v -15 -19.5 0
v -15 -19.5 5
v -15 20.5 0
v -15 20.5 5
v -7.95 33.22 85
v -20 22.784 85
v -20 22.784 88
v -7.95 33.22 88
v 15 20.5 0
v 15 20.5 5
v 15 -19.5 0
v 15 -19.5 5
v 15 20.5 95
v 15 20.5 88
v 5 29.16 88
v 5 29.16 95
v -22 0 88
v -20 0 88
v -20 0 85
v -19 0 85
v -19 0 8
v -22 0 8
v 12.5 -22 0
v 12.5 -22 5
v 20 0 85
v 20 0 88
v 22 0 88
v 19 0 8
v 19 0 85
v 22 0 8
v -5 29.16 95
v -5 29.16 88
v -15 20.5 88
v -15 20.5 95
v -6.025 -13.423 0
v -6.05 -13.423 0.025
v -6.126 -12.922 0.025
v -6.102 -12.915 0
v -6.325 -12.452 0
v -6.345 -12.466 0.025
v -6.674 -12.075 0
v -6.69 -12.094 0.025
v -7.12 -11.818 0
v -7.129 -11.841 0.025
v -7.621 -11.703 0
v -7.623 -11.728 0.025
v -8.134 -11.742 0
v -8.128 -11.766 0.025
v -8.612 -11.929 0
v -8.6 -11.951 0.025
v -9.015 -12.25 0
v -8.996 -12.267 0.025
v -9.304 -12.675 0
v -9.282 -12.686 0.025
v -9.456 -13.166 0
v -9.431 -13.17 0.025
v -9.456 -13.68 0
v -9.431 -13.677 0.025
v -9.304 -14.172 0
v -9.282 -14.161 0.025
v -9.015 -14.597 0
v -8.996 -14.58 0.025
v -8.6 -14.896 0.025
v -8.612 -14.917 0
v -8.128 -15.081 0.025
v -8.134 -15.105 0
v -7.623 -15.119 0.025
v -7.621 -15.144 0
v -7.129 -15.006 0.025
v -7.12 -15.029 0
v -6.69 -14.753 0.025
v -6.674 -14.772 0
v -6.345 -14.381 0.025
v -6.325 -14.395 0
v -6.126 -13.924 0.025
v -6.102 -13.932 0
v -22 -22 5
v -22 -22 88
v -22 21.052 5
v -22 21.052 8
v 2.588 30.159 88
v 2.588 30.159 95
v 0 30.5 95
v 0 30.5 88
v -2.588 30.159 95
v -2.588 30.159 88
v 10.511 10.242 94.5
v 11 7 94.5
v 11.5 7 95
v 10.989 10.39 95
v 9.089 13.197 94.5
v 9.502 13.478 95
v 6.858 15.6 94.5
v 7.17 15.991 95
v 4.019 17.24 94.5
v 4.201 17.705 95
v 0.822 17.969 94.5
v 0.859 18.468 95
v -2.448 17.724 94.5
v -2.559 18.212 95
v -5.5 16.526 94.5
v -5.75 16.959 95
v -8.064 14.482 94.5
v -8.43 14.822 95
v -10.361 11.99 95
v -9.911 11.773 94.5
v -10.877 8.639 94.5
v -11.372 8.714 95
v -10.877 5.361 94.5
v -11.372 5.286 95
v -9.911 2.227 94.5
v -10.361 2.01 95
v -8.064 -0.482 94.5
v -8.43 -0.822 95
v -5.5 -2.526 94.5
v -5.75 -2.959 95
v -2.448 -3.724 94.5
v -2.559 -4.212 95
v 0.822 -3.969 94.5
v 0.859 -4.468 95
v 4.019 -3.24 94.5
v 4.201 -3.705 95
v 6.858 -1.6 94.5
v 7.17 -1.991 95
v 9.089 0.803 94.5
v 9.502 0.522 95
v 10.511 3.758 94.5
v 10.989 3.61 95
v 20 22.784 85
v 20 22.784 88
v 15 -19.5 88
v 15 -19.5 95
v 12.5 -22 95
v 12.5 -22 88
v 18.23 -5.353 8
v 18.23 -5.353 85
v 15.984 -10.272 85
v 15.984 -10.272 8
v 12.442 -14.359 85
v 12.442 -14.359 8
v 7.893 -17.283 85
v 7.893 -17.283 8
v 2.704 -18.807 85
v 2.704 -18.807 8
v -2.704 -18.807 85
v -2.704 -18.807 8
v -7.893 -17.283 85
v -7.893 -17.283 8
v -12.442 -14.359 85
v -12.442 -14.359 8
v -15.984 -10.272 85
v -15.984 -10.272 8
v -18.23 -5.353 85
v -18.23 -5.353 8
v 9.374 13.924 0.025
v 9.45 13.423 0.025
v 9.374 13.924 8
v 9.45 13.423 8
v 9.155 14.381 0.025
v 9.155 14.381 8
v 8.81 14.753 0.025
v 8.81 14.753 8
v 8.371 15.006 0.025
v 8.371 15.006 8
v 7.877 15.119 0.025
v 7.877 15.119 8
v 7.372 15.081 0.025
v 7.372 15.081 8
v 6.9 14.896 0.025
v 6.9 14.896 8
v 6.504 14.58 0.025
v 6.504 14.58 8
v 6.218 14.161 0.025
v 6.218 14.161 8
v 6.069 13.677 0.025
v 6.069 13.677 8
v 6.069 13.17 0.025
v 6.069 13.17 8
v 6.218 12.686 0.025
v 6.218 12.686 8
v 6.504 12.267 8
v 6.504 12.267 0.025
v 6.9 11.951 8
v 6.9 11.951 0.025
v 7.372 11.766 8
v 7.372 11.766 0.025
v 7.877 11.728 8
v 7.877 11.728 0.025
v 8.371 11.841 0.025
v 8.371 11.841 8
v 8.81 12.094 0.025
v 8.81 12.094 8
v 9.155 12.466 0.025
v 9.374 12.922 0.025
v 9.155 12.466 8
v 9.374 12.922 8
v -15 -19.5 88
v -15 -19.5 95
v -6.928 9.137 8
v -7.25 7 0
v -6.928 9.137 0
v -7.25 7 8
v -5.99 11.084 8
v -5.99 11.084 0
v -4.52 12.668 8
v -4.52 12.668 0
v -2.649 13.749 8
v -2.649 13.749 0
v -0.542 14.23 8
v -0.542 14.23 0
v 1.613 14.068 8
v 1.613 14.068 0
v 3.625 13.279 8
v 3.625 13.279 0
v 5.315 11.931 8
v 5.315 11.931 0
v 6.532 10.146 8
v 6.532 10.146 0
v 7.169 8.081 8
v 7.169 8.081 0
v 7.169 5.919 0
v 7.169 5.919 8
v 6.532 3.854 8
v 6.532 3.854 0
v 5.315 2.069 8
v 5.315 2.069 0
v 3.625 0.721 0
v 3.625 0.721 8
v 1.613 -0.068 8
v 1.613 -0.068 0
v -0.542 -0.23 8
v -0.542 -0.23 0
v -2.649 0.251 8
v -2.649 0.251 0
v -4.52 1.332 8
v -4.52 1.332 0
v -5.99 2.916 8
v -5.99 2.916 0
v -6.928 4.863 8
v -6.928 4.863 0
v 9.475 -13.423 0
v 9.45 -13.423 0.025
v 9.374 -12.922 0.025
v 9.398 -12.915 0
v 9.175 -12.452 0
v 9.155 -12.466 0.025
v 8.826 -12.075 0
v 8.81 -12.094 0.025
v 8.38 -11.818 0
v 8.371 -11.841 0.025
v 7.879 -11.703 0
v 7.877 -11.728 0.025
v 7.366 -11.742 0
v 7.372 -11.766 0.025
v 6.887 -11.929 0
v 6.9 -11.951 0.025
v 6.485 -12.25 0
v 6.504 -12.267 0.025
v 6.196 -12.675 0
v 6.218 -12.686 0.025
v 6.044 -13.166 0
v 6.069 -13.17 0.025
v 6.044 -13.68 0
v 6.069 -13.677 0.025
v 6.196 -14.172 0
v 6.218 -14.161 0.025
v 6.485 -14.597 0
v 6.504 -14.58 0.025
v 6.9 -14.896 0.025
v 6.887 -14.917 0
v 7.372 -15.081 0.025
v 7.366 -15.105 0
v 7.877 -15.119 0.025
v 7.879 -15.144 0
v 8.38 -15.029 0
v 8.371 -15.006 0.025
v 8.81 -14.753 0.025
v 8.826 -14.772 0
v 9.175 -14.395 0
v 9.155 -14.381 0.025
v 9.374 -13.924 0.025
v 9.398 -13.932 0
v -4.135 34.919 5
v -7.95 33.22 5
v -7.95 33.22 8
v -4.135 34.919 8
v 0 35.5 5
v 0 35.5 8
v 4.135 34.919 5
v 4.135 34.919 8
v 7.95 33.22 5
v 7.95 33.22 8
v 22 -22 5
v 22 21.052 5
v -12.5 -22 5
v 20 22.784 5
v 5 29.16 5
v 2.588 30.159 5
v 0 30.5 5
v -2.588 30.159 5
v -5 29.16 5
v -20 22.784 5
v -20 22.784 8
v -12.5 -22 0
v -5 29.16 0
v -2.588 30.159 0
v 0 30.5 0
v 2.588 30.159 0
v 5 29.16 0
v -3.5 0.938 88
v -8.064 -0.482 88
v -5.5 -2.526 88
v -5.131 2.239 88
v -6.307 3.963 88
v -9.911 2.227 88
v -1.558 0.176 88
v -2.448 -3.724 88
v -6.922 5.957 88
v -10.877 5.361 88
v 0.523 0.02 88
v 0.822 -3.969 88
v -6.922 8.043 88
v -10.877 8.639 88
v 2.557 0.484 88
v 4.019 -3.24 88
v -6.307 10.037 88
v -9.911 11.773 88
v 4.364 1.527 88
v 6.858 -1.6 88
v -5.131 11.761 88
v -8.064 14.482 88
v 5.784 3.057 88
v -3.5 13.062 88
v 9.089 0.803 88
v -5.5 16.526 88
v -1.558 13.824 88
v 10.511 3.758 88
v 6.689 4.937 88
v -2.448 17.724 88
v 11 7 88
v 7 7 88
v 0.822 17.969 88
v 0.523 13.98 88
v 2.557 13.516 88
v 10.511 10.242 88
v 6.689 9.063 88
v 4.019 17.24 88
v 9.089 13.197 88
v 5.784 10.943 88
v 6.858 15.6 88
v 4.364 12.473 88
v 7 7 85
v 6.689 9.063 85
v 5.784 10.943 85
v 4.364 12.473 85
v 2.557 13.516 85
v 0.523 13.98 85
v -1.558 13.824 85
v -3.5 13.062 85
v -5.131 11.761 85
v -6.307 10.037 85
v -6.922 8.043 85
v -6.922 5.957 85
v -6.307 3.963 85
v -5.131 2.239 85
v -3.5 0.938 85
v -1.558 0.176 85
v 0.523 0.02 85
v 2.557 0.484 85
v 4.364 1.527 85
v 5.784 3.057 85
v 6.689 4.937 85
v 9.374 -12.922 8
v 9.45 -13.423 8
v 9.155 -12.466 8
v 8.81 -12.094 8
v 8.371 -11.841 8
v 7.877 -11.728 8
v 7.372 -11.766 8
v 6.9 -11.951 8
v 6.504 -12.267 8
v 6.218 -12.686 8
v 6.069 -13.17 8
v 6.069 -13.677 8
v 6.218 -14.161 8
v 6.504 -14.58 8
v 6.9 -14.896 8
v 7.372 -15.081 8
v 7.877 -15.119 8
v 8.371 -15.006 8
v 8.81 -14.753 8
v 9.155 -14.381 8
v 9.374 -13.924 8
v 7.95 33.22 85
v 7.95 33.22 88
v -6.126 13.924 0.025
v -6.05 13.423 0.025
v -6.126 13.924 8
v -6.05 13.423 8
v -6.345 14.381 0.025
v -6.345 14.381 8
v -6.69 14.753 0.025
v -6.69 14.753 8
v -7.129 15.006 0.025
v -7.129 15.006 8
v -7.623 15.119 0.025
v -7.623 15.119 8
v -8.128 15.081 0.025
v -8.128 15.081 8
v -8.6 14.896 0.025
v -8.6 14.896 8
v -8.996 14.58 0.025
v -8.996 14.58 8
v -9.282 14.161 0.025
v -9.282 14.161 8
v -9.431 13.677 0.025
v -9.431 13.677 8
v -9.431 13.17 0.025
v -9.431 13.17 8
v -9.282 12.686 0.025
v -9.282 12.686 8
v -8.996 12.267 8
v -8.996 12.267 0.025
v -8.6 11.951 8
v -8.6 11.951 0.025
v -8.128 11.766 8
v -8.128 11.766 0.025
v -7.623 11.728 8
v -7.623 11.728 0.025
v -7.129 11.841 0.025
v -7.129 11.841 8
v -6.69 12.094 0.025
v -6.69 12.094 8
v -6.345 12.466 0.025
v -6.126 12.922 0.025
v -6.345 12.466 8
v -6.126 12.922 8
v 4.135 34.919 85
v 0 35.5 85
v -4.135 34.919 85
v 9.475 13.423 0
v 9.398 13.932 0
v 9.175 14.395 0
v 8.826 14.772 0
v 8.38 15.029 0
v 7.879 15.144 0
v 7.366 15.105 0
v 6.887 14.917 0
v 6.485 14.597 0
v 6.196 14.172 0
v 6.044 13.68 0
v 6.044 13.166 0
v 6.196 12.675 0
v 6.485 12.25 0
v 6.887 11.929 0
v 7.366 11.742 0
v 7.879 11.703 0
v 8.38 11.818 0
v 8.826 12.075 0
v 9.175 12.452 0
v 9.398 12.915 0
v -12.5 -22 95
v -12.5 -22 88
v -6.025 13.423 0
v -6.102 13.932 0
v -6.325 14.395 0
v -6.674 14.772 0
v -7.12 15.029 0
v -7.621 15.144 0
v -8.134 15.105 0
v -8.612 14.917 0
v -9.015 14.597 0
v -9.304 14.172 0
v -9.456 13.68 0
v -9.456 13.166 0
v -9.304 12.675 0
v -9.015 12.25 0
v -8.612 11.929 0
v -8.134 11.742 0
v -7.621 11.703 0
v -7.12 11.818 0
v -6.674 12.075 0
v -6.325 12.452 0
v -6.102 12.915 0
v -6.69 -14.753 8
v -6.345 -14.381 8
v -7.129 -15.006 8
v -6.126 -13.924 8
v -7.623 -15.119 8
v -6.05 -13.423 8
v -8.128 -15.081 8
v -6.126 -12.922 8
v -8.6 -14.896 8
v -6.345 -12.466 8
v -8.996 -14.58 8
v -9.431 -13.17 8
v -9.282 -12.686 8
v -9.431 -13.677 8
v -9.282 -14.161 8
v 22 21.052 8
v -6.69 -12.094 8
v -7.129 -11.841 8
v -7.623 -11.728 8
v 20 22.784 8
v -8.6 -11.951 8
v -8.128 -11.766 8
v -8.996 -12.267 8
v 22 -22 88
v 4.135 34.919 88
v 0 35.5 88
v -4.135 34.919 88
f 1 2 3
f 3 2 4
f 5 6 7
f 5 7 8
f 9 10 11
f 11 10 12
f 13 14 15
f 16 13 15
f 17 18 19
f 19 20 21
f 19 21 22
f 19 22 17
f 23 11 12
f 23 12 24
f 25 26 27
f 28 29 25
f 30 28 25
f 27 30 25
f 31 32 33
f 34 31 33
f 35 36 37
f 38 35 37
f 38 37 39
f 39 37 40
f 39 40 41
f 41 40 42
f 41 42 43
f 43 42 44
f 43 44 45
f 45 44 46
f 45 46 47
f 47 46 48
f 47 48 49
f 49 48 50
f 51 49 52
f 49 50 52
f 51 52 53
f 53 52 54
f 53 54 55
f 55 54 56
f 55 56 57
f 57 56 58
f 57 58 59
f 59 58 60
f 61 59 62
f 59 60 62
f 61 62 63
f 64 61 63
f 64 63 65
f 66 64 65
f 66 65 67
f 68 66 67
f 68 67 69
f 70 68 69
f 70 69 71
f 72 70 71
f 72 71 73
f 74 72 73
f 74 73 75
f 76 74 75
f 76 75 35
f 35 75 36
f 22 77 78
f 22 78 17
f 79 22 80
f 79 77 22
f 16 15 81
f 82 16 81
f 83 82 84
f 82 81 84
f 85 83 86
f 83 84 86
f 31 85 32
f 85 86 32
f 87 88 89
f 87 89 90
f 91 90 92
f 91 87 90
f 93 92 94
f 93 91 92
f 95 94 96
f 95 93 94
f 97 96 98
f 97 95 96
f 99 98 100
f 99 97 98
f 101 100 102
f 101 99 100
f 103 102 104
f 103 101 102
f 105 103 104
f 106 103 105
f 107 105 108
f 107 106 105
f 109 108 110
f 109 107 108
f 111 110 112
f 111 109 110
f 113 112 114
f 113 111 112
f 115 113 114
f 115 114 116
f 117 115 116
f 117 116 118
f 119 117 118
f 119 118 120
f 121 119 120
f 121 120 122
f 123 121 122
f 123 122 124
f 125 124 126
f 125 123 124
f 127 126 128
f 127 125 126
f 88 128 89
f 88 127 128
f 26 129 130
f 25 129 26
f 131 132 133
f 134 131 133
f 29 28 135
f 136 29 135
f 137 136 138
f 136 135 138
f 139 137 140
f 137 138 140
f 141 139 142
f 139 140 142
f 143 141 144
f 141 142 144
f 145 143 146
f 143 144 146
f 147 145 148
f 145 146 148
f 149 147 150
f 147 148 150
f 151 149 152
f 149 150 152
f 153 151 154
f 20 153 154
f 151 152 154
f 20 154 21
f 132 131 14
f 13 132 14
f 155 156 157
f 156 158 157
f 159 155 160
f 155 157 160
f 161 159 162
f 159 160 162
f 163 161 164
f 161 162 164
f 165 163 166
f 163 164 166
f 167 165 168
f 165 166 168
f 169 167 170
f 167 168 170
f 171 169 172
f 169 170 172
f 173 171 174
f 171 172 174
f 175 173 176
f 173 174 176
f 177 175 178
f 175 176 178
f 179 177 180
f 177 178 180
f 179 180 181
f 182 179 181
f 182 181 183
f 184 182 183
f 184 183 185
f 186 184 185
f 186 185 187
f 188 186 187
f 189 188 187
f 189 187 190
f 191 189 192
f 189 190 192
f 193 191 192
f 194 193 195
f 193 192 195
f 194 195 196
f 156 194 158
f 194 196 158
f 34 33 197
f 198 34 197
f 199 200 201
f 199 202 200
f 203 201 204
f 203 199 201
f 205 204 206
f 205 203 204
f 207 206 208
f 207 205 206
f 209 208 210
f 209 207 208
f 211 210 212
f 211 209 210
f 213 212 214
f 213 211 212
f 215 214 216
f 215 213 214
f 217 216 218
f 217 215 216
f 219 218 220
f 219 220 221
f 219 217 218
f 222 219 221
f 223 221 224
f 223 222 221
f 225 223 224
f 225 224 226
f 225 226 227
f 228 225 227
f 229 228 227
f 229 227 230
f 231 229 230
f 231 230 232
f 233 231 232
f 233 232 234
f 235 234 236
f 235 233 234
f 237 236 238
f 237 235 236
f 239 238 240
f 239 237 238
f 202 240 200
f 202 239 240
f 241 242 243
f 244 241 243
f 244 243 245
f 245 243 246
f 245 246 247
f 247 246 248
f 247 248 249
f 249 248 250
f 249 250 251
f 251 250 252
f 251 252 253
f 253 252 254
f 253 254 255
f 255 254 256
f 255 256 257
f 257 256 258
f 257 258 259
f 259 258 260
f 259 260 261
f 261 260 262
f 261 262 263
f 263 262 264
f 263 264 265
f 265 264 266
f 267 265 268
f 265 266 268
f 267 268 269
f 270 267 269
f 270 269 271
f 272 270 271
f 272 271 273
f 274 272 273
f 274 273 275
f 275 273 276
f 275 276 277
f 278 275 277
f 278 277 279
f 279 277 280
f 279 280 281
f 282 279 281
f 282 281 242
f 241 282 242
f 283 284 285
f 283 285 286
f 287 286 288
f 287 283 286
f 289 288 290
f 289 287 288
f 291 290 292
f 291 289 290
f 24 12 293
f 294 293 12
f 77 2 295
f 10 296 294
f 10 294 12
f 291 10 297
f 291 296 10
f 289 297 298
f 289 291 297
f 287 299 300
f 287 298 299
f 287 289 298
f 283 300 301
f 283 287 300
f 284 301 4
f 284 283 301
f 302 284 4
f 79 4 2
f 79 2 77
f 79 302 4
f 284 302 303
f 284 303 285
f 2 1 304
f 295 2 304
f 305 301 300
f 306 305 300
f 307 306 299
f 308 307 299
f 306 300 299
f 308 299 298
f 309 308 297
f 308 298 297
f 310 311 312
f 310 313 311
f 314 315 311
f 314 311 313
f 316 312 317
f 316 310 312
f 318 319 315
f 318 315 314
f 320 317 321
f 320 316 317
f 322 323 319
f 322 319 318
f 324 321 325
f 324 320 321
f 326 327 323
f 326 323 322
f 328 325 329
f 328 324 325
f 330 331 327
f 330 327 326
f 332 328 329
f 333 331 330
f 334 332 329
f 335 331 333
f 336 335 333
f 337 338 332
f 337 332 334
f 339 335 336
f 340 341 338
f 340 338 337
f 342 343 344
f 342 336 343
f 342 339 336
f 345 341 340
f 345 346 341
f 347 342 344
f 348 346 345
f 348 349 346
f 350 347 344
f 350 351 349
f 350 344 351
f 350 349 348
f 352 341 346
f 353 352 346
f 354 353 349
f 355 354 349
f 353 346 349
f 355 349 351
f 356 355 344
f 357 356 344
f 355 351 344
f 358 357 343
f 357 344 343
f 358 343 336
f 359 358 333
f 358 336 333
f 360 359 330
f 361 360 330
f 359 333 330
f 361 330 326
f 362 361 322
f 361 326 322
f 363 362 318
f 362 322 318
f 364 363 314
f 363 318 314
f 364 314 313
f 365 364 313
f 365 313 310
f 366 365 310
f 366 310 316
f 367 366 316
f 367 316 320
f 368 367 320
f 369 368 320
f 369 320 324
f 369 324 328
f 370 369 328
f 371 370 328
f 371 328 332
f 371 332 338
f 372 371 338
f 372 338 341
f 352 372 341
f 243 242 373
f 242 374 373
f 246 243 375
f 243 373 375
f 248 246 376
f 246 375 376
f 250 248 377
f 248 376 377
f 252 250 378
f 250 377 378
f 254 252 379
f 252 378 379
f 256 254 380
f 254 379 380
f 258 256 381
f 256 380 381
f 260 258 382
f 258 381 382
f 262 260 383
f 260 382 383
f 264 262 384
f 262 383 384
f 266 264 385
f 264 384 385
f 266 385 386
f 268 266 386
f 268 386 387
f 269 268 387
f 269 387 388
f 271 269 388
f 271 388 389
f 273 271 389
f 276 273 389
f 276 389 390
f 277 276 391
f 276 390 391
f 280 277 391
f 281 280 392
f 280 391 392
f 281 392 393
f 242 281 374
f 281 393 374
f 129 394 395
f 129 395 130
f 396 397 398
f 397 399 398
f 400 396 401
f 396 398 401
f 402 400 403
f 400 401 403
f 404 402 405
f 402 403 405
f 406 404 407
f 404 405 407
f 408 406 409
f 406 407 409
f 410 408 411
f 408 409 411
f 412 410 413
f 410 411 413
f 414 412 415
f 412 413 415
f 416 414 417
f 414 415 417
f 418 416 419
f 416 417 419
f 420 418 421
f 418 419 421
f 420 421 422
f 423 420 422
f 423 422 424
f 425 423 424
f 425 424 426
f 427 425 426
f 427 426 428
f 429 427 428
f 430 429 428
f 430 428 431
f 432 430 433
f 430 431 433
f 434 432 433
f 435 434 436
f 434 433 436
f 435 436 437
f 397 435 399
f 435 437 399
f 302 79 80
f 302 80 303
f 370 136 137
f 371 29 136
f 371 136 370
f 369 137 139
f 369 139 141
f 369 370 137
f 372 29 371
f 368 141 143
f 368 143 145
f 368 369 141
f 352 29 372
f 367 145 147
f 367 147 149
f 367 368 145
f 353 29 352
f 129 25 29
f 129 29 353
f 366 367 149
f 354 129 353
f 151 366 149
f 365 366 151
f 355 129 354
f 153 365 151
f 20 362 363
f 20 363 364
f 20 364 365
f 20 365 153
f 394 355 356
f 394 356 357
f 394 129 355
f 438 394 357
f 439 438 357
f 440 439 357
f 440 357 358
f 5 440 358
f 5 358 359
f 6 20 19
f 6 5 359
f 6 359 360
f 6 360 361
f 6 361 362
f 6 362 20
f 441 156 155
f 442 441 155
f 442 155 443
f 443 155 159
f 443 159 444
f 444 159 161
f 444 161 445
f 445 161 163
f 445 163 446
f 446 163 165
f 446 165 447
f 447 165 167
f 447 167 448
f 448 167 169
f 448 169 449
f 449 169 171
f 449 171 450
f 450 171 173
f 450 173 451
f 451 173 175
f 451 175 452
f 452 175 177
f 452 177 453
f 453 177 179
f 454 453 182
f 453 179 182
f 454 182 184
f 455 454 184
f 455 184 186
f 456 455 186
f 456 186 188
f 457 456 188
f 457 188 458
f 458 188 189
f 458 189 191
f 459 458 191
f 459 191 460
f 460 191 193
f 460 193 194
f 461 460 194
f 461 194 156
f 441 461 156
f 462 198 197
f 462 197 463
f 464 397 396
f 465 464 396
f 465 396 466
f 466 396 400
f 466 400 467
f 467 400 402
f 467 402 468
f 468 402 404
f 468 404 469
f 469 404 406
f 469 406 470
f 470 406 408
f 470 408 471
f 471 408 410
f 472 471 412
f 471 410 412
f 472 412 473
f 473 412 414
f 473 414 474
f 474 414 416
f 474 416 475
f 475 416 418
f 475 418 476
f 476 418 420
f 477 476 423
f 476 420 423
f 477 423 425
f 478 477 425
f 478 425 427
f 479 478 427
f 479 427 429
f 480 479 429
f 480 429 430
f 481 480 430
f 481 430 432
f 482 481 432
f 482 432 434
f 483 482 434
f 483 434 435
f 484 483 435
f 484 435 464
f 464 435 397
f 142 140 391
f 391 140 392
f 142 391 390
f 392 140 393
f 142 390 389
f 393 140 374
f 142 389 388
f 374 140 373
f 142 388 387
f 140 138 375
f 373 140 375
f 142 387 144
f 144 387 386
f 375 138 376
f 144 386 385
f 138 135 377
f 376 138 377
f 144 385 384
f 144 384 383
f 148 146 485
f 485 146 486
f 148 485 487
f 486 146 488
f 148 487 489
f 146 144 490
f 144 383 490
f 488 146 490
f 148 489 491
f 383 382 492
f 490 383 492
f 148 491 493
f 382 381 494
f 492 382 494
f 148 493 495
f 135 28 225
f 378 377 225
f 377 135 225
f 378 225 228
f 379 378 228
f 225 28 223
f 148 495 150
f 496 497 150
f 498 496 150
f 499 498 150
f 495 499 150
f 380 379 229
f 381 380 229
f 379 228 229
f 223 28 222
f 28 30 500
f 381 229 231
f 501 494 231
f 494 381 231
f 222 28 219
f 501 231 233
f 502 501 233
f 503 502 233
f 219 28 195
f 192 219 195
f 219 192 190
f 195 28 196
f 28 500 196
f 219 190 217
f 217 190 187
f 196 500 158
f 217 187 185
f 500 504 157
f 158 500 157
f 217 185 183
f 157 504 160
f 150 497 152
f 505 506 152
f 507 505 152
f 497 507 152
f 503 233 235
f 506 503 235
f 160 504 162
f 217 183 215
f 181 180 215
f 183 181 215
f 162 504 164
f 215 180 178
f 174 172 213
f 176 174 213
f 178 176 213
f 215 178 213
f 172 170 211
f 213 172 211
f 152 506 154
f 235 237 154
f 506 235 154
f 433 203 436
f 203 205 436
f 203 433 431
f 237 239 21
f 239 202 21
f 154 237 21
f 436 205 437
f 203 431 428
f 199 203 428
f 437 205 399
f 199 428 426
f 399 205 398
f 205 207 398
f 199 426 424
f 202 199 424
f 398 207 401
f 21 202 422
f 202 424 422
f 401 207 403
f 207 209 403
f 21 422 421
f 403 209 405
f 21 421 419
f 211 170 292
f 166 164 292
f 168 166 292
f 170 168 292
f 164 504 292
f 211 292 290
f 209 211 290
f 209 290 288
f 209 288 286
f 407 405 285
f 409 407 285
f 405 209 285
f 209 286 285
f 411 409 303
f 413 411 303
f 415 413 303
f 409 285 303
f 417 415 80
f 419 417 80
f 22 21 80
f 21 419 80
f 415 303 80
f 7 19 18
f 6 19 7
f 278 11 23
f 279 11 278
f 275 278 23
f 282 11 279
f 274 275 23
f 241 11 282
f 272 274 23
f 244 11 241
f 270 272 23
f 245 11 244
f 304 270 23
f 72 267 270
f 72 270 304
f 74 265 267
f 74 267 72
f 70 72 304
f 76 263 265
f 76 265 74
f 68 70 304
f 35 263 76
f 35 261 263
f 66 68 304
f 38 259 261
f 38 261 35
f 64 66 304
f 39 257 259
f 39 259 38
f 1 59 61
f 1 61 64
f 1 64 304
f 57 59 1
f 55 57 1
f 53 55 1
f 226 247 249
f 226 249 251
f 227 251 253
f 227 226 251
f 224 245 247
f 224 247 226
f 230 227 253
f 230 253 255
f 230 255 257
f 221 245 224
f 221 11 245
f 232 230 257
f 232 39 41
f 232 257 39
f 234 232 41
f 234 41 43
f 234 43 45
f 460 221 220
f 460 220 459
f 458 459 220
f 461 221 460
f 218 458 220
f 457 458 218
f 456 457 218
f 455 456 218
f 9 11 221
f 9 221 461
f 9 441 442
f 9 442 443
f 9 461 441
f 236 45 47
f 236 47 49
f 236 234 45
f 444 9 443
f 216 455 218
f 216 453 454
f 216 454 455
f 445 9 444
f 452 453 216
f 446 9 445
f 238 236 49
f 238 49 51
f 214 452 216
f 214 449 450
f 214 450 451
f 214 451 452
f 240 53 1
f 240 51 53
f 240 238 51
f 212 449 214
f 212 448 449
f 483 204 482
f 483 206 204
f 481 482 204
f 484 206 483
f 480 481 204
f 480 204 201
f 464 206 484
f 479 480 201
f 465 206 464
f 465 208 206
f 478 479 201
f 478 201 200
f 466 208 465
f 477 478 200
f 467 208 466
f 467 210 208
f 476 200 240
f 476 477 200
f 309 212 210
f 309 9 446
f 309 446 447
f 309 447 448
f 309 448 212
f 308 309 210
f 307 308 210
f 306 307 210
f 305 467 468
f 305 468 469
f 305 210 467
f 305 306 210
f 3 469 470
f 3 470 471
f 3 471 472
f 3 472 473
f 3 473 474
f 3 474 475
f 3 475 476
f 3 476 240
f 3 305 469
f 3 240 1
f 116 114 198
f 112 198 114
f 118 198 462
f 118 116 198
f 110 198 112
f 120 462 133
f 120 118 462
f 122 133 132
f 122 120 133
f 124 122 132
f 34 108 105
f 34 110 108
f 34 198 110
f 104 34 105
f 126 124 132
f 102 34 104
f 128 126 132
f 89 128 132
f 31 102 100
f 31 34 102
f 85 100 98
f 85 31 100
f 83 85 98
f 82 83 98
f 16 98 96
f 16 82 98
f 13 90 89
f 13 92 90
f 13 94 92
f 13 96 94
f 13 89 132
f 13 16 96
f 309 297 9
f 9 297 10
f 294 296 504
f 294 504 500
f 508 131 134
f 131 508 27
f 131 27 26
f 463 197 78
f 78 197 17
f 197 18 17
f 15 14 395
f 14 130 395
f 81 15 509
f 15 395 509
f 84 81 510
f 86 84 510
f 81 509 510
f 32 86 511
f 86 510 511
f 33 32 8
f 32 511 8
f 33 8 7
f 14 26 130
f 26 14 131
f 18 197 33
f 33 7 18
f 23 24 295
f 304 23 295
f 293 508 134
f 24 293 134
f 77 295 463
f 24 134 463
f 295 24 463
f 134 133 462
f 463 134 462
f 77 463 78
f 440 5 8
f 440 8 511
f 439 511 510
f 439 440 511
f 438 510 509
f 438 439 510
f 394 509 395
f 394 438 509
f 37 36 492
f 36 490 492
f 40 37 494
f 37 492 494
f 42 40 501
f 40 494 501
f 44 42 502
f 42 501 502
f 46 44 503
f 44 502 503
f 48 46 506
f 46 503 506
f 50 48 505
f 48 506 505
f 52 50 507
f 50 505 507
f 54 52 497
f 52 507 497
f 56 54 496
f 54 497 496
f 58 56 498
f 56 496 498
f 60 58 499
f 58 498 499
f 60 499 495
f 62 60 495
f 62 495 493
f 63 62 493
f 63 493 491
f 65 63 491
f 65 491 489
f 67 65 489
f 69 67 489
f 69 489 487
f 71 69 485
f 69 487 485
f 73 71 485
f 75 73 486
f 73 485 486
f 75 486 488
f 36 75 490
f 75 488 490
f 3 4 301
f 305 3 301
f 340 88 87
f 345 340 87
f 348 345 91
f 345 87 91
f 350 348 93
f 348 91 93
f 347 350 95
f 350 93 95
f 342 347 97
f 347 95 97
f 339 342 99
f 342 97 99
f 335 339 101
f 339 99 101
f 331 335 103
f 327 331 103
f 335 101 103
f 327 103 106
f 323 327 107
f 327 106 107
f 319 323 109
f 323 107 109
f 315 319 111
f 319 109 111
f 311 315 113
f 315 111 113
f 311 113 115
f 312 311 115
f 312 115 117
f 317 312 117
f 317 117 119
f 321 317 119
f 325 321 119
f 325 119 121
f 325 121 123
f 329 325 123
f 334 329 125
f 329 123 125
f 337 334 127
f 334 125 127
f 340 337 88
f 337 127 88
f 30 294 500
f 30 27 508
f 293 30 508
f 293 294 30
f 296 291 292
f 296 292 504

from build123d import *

# Parameters (mm, degrees)
SKETCH3_R                      = 7.25
BOSS_EXTRUDE1_DEPTH            = 5
BOSS_EXTRUDE2_DEPTH            = 80
BOSS_EXTRUDE3_DEPTH            = 10
SKETCH16_R                     = 11
CUT_EXTRUDE1_DEPTH             = 7
CUT_EXTRUDE2_REACH             = 97.699
SKETCH17_R                     = 7
CHAMFER2_SIZE                  = 0.5
CHAMFER3_SIZE                  = 0.5
BOSS_EXTRUDE7_DEPTH            = 3
CUT_EXTRUDE7_DEPTH             = 7
SKETCH3_6_R                    = 7.25
CUT_EXTRUDE6_DEPTH             = 5
BOSS_EXTRUDE8_START            = -5
BOSS_EXTRUDE8_OUTLINE_R        = 7.25
BOSS_EXTRUDE8_DEPTH            = 5
SKETCH24_R                     = 7.25
BOSS_EXTRUDE12_DEPTH           = 3
M3_CLEARANCE_HOLE1_D           = 3.4
M3_CLEARANCE_HOLE1_DEPTH       = 10
M3_CLEARANCE_HOLE1_CSINK_D     = 3.45
M3_CLEARANCE_HOLE1_CSINK_ANGLE = 90
M3_CLEARANCE_HOLE1_TIP         = 1.021463052
CUT_EXTRUDE8_DEPTH             = 5


# Read off the part's stored shape, not the designer's step: Boss-Extrude8
with BuildPart() as part:
    # Sketch3 → Boss-Extrude1 (new body)
    with BuildSketch(Plane.XY):
        with BuildLine():
            Line((22, 0), (22, -22))
            Line((22, -22), (-22, -22))
            Line((-22, -22), (-22, 0))
            ThreePointArc((-22, 0), (0, 22), (22, 0))
        make_face()
        with Locations((0, 7)):
            Circle(SKETCH3_R, mode=Mode.SUBTRACT)
    extrude(amount=BOSS_EXTRUDE1_DEPTH)

    # Sketch7 → Boss-Extrude2 (add)
    with BuildSketch(Plane.XY.offset(5)):
        with BuildLine():
            Line((-19, 0), (-22, 0))
            Line((-22, 0), (-22, -22))
            Line((-22, -22), (22, -22))
            Line((22, -22), (22, 0))
            Line((22, 0), (19, 0))
            ThreePointArc((19, 0), (0, -19), (-19, 0))
        make_face()
    extrude(amount=BOSS_EXTRUDE2_DEPTH)

    # Sketch9 → Boss-Extrude3 (add)
    with BuildSketch(Plane.XY.offset(85)):
        with BuildLine():
            Line((-15, 20.5), (-15, -22))
            Line((-15, -22), (15, -22))
            Line((15, -22), (15, 20.5))
            Line((15, 20.5), (5, 29.160254038))
            ThreePointArc((5, 29.160254038), (0, 30.5), (-5, 29.160254038))
            Line((-5, 29.160254038), (-15, 20.5))
        make_face()
    extrude(amount=BOSS_EXTRUDE3_DEPTH)

    # Sketch16 → Cut-Extrude1 (cut)
    with BuildSketch(Plane.XY.offset(95)):
        with Locations((0, 7)):
            Circle(SKETCH16_R)
    extrude(amount=-CUT_EXTRUDE1_DEPTH, mode=Mode.SUBTRACT)

    # Sketch17 → Cut-Extrude2 (cut, up to next)
    with BuildSketch(Plane.XY.offset(88), mode=Mode.PRIVATE) as cut_extrude2_sk1:
        with Locations((0, 7)):
            Circle(SKETCH17_R)
    cut_extrude2_tool1 = extrude(cut_extrude2_sk1.sketch, amount=-CUT_EXTRUDE2_REACH, mode=Mode.PRIVATE) & part.part
    add(cut_extrude2_tool1.solids().sort_by_distance((0, 7, 88))[0], mode=Mode.SUBTRACT)

    # Chamfer2
    chamfer2_edges = [part.edges().sort_by_distance(p)[0] for p in [
        (-11, 7, 95),
    ]]
    chamfer(chamfer2_edges, length=CHAMFER2_SIZE)

    # Chamfer3
    chamfer3_edges = [part.edges().sort_by_distance(p)[0] for p in [
        (-7.25, 7, 5),
    ]]
    chamfer(chamfer3_edges, length=CHAMFER3_SIZE)

    # Sketch22 → Boss-Extrude7 (add)
    with BuildSketch(Plane(origin=(0, 0, 85), x_dir=(-1, 0, 0), z_dir=(0, 0, -1))):
        with BuildLine():
            Line((-20, 22.784251259), (-20, 0))
            Line((-20, 0), (-20, -11.66190379))
            Line((-20, -11.66190379), (-20, -22))
            Line((-20, -22), (-15, -22))
            Line((-15, -22), (-15, -11.66190379))
            Line((-15, -11.66190379), (-15, 20.5))
            Line((-15, 20.5), (-5, 29.160254038))
            ThreePointArc((-5, 29.160254038), (0, 30.5), (5, 29.160254038))
            Line((5, 29.160254038), (15, 20.5))
            Line((15, 20.5), (15, -11.66190379))
            Line((15, -11.66190379), (15, -22))
            Line((15, -22), (20, -22))
            Line((20, -22), (20, -11.66190379))
            Line((20, -11.66190379), (20, 0))
            Line((20, 0), (20, 22.784251259))
            Line((20, 22.784251259), (7.949555075, 33.220242691))
            ThreePointArc((7.949555075, 33.220242691), (0, 35.5), (-7.949555075, 33.220242691))
            Line((-7.949555075, 33.220242691), (-20, 22.784251259))
        make_face()
        Polygon((22, 0), (20, 0), (20, -11.66190379), (20, -22), (22, -22), align=None)
        Polygon((-20, -11.66190379), (-20, 0), (-22, 0), (-22, -22), (-20, -22), align=None)
    extrude(amount=-BOSS_EXTRUDE7_DEPTH)

    # Sketch25 → Cut-Extrude7 (cut)
    with BuildSketch(Plane.XY.offset(95)):
        Polygon((-15, -19.5), (-12.5, -22), (-15, -22), align=None)
        Polygon((15, -19.5), (12.5, -22), (15, -22), align=None)
    extrude(amount=-CUT_EXTRUDE7_DEPTH, mode=Mode.SUBTRACT)

    # Sketch3<6> → Cut-Extrude6 (cut)
    # profile 1 of 3: a face of its own
    with BuildSketch(Plane.XY):
        with BuildLine():
            ThreePointArc((0, -22), (15.556349186, -15.556349186), (22, 0))
            ThreePointArc((22, 0), (0, 22), (-22, 0))
            ThreePointArc((-22, 0), (-15.556349186, -15.556349186), (0, -22))
        make_face()
        with Locations((0, 7)):
            Circle(SKETCH3_6_R, mode=Mode.SUBTRACT)
    # profile 2 of 3: a face of its own
    with BuildSketch(Plane.XY):
        with BuildLine():
            ThreePointArc((0, -22), (-15.556349186, -15.556349186), (-22, 0))
            Line((-22, 0), (-22, -22))
            Line((-22, -22), (0, -22))
        make_face()
    # profile 3 of 3: a face of its own
    with BuildSketch(Plane.XY):
        with BuildLine():
            Line((22, -22), (22, 0))
            ThreePointArc((22, 0), (15.556349186, -15.556349186), (0, -22))
            Line((0, -22), (22, -22))
        make_face()
    extrude(amount=CUT_EXTRUDE6_DEPTH, mode=Mode.SUBTRACT)

    # Boss-Extrude8 outline → Boss-Extrude8 (add)
    with BuildSketch(Plane(origin=(0, 0, 0), x_dir=(-1, 0, 0), z_dir=(0, 0, -1)).offset(BOSS_EXTRUDE8_START)):
        with BuildLine():
            Line((15, 20.5), (5, 29.160254038))
            ThreePointArc((5, 29.160254038), (0, 30.5), (-5, 29.160254038))
            Line((-5, 29.160254038), (-15, 20.5))
            Line((-15, 20.5), (-15, -22))
            Line((-15, -22), (15, -22))
            Line((15, -22), (15, 20.5))
        make_face()
        with Locations((0, 7)):
            Circle(BOSS_EXTRUDE8_OUTLINE_R, mode=Mode.SUBTRACT)
    extrude(amount=BOSS_EXTRUDE8_DEPTH)

    # Sketch24 → Boss-Extrude12 (add)
    with BuildSketch(Plane(origin=(0, 0, 5), x_dir=(-1, 0, 0), z_dir=(0, 0, -1))):
        with BuildLine():
            Line((-7.949555075, 33.220242691), (-20, 22.784251259))
            Line((-20, 22.784251259), (-22, 21.052200451))
            Line((-22, 21.052200451), (-22, 0))
            Line((-22, 0), (-22, -22))
            Line((-22, -22), (22, -22))
            Line((22, -22), (22, 0))
            Line((22, 0), (22, 21.052200451))
            Line((22, 21.052200451), (20, 22.784251259))
            Line((20, 22.784251259), (7.949555075, 33.220242691))
            ThreePointArc((7.949555075, 33.220242691), (0, 35.5), (-7.949555075, 33.220242691))
        make_face()
        with Locations((0, 7)):
            Circle(SKETCH24_R, mode=Mode.SUBTRACT)
    extrude(amount=-BOSS_EXTRUDE12_DEPTH)

    # M3 Clearance Hole1
    with Locations(Plane(origin=(0, 0, 0), x_dir=(-1, 0, 0), z_dir=(0, 0, -1))):
        with Locations((7.75, 13.423393759), (-7.75, 13.423393759), (-7.75, -13.423393759), (7.75, -13.423393759)):
            CounterSinkHole(M3_CLEARANCE_HOLE1_D / 2, M3_CLEARANCE_HOLE1_CSINK_D / 2, depth=M3_CLEARANCE_HOLE1_DEPTH, counter_sink_angle=M3_CLEARANCE_HOLE1_CSINK_ANGLE)
            with Locations((0, 0, -(M3_CLEARANCE_HOLE1_DEPTH + M3_CLEARANCE_HOLE1_TIP / 2))):  # 118° drill point
                Cone(0, M3_CLEARANCE_HOLE1_D / 2, M3_CLEARANCE_HOLE1_TIP, mode=Mode.SUBTRACT)

    # Sketch26 → Cut-Extrude8 (cut)
    with BuildSketch(Plane(origin=(0, 0, 0), x_dir=(-1, 0, 0), z_dir=(0, 0, -1))):
        Polygon((-15, -19.5), (-12.5, -22), (-15, -22), align=None)
        Polygon((15, -19.5), (12.5, -22), (15, -22), align=None)
    extrude(amount=-CUT_EXTRUDE8_DEPTH, mode=Mode.SUBTRACT)


solid = part.part
